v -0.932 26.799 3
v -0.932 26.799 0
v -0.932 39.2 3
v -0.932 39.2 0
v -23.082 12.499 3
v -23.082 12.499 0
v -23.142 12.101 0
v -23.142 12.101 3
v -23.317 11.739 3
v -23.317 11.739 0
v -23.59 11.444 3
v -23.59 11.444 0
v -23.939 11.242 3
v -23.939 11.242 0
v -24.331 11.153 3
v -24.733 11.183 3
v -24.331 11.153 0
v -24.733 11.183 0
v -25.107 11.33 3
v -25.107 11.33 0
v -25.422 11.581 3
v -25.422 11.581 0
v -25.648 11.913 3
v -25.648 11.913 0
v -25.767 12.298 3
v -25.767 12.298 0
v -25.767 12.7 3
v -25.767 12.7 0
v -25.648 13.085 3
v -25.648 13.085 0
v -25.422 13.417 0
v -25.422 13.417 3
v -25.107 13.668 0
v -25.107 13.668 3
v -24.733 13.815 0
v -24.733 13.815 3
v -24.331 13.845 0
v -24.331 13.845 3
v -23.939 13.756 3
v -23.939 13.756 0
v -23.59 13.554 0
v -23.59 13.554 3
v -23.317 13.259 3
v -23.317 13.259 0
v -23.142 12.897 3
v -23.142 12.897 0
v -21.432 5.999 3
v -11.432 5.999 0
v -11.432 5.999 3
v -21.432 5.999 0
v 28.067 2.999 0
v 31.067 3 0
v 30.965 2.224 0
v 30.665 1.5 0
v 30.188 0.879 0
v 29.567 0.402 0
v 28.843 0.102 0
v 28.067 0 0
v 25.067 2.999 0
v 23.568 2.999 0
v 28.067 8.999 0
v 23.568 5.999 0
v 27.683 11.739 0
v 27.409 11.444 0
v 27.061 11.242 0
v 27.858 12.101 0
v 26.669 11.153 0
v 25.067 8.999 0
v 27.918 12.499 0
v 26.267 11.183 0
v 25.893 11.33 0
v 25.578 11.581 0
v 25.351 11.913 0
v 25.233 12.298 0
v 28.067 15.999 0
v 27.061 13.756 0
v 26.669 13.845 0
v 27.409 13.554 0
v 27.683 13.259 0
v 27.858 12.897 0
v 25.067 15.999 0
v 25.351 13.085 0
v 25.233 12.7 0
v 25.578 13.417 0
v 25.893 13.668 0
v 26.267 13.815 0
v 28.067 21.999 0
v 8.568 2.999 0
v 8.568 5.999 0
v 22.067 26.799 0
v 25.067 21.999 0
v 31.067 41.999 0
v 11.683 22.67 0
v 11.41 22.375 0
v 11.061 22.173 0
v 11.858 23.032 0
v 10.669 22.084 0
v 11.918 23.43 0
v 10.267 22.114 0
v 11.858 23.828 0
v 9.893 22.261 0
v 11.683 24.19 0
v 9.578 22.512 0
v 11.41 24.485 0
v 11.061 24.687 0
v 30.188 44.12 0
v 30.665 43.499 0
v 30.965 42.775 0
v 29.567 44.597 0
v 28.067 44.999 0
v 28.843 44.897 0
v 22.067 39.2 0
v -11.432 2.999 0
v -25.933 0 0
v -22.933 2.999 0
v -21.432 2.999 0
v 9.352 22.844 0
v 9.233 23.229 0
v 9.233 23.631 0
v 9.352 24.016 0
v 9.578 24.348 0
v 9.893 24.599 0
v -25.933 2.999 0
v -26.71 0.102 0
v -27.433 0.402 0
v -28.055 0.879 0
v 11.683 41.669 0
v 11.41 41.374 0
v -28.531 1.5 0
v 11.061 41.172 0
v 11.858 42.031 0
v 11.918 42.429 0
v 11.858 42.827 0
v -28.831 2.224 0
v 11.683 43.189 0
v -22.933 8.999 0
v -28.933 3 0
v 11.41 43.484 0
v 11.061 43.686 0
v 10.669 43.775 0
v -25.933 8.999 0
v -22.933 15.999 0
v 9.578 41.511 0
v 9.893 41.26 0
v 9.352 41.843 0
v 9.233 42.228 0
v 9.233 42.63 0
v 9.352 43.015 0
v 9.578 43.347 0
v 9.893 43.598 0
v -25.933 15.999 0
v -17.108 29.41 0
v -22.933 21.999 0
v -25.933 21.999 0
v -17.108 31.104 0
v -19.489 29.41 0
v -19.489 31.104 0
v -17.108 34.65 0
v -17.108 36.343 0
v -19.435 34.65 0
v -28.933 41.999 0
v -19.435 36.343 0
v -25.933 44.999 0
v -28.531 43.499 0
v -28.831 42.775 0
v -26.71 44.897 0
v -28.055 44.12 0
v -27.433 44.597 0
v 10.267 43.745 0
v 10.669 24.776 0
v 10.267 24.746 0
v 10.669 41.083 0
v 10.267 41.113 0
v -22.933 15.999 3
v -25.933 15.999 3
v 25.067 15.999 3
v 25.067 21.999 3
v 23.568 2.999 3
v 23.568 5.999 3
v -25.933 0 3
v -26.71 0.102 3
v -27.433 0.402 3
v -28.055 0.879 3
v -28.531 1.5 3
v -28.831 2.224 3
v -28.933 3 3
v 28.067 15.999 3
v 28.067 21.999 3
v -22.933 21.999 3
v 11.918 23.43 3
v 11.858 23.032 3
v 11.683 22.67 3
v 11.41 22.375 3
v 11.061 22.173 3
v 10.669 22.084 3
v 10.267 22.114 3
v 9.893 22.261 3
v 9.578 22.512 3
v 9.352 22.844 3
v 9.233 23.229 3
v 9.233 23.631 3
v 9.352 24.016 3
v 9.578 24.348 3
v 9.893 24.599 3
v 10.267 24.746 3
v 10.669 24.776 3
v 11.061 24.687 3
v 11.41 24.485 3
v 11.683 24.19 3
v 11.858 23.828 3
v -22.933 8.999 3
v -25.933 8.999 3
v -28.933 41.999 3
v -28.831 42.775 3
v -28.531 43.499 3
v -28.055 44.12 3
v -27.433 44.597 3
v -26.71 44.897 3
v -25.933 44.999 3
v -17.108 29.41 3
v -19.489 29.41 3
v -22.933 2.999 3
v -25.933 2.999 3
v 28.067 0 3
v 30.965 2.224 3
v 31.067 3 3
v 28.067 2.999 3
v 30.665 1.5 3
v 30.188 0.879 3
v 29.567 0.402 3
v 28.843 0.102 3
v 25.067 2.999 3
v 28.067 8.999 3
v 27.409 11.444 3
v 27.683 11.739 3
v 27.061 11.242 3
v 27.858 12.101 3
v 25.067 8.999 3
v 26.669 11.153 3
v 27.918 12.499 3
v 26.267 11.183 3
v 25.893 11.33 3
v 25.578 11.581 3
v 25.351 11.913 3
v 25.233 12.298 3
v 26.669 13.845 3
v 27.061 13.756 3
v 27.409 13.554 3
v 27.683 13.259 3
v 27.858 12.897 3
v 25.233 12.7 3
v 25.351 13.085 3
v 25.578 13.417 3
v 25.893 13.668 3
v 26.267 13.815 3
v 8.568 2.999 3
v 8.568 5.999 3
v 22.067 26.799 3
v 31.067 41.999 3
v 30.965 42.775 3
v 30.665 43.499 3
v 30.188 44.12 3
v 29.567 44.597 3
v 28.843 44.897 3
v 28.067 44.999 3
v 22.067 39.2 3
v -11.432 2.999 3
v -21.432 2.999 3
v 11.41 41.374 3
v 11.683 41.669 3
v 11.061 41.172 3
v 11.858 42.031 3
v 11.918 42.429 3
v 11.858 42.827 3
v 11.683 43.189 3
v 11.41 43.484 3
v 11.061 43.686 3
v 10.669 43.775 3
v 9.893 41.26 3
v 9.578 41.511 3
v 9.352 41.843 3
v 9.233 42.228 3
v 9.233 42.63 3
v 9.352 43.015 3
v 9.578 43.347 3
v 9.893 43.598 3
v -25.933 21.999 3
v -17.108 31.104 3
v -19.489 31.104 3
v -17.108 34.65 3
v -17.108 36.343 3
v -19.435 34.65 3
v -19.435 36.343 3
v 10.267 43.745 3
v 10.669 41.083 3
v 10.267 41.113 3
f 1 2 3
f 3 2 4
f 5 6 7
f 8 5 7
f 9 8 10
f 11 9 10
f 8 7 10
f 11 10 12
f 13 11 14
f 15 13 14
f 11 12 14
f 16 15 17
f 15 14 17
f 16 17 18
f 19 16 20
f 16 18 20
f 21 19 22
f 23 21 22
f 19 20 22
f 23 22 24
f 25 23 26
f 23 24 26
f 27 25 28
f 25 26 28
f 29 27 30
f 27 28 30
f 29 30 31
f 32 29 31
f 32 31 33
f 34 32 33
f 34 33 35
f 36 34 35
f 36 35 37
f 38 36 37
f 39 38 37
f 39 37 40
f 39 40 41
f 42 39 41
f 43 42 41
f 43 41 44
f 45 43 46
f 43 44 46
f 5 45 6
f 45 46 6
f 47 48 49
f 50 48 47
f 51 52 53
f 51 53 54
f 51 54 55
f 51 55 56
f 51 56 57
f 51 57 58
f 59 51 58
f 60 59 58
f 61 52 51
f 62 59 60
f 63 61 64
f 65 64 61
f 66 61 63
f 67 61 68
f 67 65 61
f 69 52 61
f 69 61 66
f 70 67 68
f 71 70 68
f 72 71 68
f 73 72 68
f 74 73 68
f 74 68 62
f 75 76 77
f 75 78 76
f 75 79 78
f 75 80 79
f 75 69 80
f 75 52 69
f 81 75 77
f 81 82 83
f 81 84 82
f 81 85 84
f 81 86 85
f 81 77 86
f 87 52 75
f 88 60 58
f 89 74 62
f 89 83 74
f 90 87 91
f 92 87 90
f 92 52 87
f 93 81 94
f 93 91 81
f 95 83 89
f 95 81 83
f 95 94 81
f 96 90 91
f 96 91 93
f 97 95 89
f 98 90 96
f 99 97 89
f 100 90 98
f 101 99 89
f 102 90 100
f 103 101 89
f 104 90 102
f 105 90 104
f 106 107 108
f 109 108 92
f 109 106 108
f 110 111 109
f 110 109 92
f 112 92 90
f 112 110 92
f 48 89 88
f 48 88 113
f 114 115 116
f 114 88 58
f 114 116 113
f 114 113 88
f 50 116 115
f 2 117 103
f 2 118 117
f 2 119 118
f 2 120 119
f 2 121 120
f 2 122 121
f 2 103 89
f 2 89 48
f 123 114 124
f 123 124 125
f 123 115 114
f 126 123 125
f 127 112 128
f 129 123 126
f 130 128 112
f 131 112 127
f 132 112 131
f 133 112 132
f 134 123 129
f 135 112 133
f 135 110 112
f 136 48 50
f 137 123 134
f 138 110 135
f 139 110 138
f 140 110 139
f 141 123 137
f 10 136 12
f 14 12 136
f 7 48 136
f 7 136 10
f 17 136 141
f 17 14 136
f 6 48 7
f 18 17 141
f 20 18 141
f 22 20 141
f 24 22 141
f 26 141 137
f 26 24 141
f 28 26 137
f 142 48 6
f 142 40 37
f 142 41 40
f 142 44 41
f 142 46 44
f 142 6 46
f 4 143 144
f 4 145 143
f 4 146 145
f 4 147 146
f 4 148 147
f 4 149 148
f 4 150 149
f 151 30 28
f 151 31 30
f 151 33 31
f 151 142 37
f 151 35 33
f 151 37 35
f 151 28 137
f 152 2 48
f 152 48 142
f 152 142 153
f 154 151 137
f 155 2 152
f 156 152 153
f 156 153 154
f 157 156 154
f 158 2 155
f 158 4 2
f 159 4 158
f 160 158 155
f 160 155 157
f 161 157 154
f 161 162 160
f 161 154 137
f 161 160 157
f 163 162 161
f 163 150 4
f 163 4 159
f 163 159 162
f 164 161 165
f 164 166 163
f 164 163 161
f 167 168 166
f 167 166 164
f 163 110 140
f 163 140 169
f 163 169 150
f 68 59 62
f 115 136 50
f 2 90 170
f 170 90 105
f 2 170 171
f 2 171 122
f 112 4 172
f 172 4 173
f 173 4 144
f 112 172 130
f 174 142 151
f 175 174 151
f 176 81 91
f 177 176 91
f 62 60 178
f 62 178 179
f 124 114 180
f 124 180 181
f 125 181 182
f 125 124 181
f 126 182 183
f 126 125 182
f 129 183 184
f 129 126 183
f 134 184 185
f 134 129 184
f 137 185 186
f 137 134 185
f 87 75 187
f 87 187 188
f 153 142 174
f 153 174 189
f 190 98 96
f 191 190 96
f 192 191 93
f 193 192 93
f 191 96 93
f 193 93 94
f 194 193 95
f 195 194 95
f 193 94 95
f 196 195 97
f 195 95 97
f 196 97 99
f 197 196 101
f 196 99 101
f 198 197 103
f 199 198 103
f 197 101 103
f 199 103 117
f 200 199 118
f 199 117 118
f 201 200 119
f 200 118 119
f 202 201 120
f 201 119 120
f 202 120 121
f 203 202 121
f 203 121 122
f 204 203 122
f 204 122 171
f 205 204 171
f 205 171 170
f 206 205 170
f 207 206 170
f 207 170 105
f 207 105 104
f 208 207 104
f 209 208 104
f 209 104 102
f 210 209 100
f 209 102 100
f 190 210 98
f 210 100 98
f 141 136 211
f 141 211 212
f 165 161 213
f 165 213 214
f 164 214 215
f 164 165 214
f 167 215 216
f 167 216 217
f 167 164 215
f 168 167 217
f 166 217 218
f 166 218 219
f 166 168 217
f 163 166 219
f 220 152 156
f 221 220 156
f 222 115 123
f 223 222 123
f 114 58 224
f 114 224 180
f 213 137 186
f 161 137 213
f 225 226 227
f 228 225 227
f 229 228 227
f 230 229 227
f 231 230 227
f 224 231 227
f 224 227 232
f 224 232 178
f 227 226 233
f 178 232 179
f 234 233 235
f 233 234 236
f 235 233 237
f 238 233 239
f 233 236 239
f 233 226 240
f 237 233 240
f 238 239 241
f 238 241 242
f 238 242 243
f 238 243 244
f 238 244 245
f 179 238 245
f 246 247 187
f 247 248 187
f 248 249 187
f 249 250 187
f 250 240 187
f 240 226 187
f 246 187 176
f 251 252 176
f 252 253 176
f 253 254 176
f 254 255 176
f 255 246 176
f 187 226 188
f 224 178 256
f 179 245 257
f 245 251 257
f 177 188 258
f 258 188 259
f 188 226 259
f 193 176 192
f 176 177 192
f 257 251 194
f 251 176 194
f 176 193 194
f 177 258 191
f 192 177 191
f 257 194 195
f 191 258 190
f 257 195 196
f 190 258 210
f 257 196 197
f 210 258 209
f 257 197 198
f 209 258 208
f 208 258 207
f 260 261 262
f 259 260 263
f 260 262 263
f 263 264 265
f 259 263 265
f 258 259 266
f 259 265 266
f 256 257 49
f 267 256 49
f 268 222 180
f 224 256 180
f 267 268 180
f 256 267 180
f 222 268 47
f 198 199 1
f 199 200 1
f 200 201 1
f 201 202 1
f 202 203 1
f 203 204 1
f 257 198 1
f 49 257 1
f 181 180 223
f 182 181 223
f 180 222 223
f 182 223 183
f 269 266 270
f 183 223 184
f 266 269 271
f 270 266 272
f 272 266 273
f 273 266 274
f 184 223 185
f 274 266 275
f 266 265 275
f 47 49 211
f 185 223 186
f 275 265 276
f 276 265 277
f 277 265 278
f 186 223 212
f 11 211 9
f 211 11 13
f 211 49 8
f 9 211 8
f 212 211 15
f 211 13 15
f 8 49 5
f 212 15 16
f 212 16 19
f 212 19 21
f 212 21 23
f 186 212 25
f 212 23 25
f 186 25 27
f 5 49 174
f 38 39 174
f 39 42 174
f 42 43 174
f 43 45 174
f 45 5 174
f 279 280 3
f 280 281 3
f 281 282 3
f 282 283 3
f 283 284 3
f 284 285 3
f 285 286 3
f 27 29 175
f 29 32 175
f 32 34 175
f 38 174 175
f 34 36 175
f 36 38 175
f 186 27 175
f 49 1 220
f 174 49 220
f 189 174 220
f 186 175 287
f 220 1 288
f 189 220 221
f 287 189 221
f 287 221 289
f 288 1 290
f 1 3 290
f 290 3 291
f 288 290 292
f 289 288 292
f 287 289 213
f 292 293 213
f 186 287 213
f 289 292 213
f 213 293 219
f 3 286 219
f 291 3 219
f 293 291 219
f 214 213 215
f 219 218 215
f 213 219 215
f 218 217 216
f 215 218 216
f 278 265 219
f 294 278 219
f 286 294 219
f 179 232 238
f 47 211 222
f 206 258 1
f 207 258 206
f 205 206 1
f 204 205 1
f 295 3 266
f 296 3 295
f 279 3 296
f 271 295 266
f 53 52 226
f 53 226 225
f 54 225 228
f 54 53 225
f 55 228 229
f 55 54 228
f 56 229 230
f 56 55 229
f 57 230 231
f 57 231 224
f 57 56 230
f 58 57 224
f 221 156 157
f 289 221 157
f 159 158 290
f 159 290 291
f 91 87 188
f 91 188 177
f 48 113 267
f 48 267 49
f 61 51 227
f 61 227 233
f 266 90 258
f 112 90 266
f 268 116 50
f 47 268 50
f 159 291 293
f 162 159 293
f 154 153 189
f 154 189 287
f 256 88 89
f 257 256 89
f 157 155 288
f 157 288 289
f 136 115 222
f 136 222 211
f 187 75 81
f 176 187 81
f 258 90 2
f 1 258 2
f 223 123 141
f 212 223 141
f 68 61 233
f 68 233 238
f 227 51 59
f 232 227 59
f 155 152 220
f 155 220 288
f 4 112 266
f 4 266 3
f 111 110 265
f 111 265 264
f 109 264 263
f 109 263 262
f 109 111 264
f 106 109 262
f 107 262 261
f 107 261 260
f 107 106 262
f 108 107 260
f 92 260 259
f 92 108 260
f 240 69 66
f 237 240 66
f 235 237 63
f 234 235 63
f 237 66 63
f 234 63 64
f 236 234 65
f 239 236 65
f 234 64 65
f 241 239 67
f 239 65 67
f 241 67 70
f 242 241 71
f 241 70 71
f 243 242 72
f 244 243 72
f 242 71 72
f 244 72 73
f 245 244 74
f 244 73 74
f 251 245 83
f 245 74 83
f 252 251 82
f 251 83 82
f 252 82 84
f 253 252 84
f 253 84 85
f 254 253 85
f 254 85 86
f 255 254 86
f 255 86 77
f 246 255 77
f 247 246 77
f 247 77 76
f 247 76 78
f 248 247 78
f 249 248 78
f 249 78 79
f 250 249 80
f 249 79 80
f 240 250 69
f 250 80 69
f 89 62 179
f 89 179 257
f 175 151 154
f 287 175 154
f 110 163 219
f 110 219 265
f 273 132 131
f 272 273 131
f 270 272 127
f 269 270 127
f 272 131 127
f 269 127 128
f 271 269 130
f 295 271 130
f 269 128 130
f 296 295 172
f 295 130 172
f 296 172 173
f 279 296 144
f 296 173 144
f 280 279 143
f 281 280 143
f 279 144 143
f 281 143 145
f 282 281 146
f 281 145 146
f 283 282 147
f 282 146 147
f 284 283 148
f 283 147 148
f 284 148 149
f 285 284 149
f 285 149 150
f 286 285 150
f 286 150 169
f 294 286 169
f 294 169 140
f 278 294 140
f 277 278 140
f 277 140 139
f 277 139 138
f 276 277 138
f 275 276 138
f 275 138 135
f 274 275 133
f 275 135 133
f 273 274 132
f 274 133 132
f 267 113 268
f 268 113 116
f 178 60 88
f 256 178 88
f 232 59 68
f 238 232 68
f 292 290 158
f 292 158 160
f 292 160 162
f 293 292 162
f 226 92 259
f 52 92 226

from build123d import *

# Parameters (mm, degrees)
SKETCH_1_R      = 1.35
SKETCH_1_W      = 3
SKETCH_1_H      = 6
SKETCH_1_W_2    = 15
SKETCH_1_H_2    = 3
SKETCH_1_W_3    = 22.999
SKETCH_1_H_3    = 12.401
SKETCH_1_W_4    = 2.327
SKETCH_1_H_4    = 1.693
SKETCH_1_W_5    = 2.381
SKETCH_1_H_5    = 1.694
SKETCH_1_W_6    = 10
EXTRUDE_1_DEPTH = 3


with BuildPart() as part:
    # 草图1 → 凸台-拉伸1 (new body)
    with BuildSketch(Plane(origin=(0, 0, 0), x_dir=(-1, 0, 0), z_dir=(0, 0, -1))):
        with BuildLine():
            Line((-28.066816536, 0), (25.933183464, 0))
            ThreePointArc((25.933183464, 0), (28.054503808, 0.878679656), (28.933183464, 3))
            Line((28.933183464, 3), (28.933183464, 41.999))
            ThreePointArc((28.933183464, 41.999), (28.054503808, 44.120320344), (25.933183464, 44.999))
            Line((25.933183464, 44.999), (-28.066816536, 44.999))
            ThreePointArc((-28.066816536, 44.999), (-30.18813688, 44.120320344), (-31.066816536, 41.999))
            Line((-31.066816536, 41.999), (-31.066816536, 3))
            ThreePointArc((-31.066816536, 3), (-30.18813688, 0.878679656), (-28.066816536, 0))
        make_face()
        with Locations(Location((-10.567816536, 42.429, 0), (0, 0, 180))):
            Circle(SKETCH_1_R, mode=Mode.SUBTRACT)
        with Locations(Location((24.432183464, 12.499, 0), (0, 0, 180))):
            Circle(SKETCH_1_R, mode=Mode.SUBTRACT)
        with Locations(Location((-10.567816536, 23.43, 0), (0, 0, 180))):
            Circle(SKETCH_1_R, mode=Mode.SUBTRACT)
        with Locations(Location((-26.567767322, 12.499, 0), (0, 0, 180))):
            Circle(SKETCH_1_R, mode=Mode.SUBTRACT)
        with Locations((-26.566816536, 18.999)):
            Rectangle(SKETCH_1_W, SKETCH_1_H, mode=Mode.SUBTRACT)
        with Locations((-26.566816536, 5.999)):
            Rectangle(SKETCH_1_W, SKETCH_1_H, mode=Mode.SUBTRACT)
        with Locations((-16.067816536, 4.499)):
            Rectangle(SKETCH_1_W_2, SKETCH_1_H_2, mode=Mode.SUBTRACT)
        with Locations((-10.567316536, 32.9995)):
            Rectangle(SKETCH_1_W_3, SKETCH_1_H_3, mode=Mode.SUBTRACT)
        with Locations((18.271683464, 35.4965)):
            Rectangle(SKETCH_1_W_4, SKETCH_1_H_4, mode=Mode.SUBTRACT)
        with Locations((18.298683464, 30.257)):
            Rectangle(SKETCH_1_W_5, SKETCH_1_H_5, mode=Mode.SUBTRACT)
        with Locations((24.433183464, 18.999)):
            Rectangle(SKETCH_1_W, SKETCH_1_H, mode=Mode.SUBTRACT)
        with Locations((24.433183464, 5.999)):
            Rectangle(SKETCH_1_W, SKETCH_1_H, mode=Mode.SUBTRACT)
        with Locations((16.432183464, 4.499)):
            Rectangle(SKETCH_1_W_6, SKETCH_1_H_2, mode=Mode.SUBTRACT)
    extrude(amount=-EXTRUDE_1_DEPTH)


solid = part.part
